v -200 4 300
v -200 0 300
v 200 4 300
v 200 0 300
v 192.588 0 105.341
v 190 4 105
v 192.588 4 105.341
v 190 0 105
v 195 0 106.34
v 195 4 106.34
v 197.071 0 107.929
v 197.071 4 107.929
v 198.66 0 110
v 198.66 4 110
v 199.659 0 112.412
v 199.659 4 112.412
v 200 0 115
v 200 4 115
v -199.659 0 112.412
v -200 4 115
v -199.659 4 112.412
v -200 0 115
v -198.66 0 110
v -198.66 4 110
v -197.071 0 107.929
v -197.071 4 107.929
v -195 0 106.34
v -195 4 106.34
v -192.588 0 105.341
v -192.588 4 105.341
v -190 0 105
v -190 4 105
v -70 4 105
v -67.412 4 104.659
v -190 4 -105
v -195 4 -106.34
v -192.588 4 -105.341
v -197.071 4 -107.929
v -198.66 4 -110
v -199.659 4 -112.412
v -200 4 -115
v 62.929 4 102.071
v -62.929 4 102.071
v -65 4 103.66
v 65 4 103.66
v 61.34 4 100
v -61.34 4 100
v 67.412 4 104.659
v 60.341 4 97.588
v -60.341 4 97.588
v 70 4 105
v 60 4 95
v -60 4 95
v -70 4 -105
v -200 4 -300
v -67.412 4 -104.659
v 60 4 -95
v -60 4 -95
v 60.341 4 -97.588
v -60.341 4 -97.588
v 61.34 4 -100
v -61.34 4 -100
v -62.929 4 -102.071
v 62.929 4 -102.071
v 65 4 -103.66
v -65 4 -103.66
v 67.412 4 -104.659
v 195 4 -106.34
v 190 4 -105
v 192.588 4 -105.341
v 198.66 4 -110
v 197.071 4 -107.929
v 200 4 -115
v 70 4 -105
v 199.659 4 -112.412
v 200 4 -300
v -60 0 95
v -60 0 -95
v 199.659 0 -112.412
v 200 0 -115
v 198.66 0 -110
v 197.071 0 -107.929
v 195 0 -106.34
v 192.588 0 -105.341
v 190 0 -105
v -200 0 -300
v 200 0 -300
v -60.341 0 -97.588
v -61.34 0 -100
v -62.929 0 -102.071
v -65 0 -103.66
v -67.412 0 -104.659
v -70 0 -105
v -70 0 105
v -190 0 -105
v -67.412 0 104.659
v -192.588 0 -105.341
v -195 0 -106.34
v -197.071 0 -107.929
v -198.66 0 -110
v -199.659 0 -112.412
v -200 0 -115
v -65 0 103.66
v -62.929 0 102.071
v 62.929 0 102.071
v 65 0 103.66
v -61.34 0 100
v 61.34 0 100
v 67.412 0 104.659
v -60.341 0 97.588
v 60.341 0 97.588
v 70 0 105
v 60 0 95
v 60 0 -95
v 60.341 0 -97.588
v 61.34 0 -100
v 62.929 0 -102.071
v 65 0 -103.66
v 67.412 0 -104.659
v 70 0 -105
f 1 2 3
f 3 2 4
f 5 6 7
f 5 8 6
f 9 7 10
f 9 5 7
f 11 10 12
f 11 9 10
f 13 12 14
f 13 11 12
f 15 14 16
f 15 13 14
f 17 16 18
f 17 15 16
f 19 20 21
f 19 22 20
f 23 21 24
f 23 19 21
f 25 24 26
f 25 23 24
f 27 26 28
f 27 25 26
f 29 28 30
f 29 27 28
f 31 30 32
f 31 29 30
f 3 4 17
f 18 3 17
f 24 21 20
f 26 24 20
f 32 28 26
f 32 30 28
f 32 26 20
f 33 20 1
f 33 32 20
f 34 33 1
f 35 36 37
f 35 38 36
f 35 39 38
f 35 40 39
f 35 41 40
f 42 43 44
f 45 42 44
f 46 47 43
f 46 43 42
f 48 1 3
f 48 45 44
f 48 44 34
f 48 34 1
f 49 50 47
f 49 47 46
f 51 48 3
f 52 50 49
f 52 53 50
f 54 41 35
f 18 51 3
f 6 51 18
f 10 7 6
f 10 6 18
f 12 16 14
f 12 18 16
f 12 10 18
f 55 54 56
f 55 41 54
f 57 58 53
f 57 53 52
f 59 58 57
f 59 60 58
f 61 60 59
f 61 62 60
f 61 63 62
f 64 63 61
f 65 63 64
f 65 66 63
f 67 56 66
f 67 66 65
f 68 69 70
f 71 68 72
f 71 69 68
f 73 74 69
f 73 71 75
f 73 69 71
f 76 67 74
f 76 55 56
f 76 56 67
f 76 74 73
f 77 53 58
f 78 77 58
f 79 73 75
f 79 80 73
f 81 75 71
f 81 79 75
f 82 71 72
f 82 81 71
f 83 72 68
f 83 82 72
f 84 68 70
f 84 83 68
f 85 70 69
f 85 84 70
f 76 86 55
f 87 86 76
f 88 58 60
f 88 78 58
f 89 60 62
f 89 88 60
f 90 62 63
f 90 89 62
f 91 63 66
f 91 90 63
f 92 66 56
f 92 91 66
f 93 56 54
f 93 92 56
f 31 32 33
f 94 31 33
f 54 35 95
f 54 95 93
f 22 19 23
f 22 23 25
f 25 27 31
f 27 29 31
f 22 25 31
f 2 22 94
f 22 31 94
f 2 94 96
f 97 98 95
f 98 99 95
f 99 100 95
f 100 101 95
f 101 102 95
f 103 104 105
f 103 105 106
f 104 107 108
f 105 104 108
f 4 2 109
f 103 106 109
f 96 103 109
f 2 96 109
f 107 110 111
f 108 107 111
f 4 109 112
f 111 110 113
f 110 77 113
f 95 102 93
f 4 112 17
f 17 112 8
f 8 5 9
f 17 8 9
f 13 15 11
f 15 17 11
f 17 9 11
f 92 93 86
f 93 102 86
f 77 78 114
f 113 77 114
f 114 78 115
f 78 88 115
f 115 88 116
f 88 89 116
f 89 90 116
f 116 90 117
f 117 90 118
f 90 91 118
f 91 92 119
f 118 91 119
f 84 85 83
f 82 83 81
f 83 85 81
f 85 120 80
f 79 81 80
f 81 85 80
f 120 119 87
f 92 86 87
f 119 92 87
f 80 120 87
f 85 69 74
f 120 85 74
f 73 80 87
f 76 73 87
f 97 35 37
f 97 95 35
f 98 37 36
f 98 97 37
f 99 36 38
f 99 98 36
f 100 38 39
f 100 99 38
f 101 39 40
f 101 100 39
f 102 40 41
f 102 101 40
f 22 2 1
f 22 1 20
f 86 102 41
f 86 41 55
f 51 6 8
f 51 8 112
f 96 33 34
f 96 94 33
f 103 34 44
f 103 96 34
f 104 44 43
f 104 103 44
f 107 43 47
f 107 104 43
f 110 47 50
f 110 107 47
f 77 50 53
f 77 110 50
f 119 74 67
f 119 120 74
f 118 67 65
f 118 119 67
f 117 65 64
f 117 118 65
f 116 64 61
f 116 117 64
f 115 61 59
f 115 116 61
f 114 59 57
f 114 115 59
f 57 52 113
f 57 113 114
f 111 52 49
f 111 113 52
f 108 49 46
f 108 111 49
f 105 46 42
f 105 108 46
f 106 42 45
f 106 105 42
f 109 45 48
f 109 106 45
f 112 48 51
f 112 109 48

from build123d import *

# Parameters (mm, degrees)
SKETCH_1_W          = 400
SKETCH_1_H          = 600
EXTRUDE_1_DEPTH     = 4
SKETCH_2_W          = 140
SKETCH_2_H          = 210
CUT_EXTRUDE_3_DEPTH = 361.577314872
FILLET_1_R          = 10


with BuildPart() as part:
    # 草图1 → 凸台-拉伸1 (new body)
    with BuildSketch(Plane(origin=(0, 0, 0), x_dir=(1, 0, 0), z_dir=(0, 1, 0))):
        Rectangle(SKETCH_1_W, SKETCH_1_H)
    extrude(amount=EXTRUDE_1_DEPTH)

    # 草图2 → 切除-拉伸3 (cut, through all)
    with BuildSketch(Plane(origin=(0, 4, 0), x_dir=(1, 0, 0), z_dir=(0, 1, 0))):
        with Locations((-130, 0)):
            Rectangle(SKETCH_2_W, SKETCH_2_H)
    cut_extrude_3 = extrude(amount=-CUT_EXTRUDE_3_DEPTH, mode=Mode.SUBTRACT)

    # 镜向1: 切除-拉伸3 across plane
    add(cut_extrude_3.mirror(Plane(origin=(0, 0, 0), x_dir=(0, 0, 1), z_dir=(1, 0, 0))), mode=Mode.SUBTRACT)

    # 圆角1
    fillet_1_edges = [part.edges().sort_by_distance(p)[0] for p in [
        (-60, 2, -105),
        (-60, 2, 105),
        (-200, 2, 105),
        (-200, 2, -105),
        (60, 2, 105),
        (60, 2, -105),
        (200, 2, -105),
        (200, 2, 105),
    ]]
    fillet(fillet_1_edges, radius=FILLET_1_R)


solid = part.part
